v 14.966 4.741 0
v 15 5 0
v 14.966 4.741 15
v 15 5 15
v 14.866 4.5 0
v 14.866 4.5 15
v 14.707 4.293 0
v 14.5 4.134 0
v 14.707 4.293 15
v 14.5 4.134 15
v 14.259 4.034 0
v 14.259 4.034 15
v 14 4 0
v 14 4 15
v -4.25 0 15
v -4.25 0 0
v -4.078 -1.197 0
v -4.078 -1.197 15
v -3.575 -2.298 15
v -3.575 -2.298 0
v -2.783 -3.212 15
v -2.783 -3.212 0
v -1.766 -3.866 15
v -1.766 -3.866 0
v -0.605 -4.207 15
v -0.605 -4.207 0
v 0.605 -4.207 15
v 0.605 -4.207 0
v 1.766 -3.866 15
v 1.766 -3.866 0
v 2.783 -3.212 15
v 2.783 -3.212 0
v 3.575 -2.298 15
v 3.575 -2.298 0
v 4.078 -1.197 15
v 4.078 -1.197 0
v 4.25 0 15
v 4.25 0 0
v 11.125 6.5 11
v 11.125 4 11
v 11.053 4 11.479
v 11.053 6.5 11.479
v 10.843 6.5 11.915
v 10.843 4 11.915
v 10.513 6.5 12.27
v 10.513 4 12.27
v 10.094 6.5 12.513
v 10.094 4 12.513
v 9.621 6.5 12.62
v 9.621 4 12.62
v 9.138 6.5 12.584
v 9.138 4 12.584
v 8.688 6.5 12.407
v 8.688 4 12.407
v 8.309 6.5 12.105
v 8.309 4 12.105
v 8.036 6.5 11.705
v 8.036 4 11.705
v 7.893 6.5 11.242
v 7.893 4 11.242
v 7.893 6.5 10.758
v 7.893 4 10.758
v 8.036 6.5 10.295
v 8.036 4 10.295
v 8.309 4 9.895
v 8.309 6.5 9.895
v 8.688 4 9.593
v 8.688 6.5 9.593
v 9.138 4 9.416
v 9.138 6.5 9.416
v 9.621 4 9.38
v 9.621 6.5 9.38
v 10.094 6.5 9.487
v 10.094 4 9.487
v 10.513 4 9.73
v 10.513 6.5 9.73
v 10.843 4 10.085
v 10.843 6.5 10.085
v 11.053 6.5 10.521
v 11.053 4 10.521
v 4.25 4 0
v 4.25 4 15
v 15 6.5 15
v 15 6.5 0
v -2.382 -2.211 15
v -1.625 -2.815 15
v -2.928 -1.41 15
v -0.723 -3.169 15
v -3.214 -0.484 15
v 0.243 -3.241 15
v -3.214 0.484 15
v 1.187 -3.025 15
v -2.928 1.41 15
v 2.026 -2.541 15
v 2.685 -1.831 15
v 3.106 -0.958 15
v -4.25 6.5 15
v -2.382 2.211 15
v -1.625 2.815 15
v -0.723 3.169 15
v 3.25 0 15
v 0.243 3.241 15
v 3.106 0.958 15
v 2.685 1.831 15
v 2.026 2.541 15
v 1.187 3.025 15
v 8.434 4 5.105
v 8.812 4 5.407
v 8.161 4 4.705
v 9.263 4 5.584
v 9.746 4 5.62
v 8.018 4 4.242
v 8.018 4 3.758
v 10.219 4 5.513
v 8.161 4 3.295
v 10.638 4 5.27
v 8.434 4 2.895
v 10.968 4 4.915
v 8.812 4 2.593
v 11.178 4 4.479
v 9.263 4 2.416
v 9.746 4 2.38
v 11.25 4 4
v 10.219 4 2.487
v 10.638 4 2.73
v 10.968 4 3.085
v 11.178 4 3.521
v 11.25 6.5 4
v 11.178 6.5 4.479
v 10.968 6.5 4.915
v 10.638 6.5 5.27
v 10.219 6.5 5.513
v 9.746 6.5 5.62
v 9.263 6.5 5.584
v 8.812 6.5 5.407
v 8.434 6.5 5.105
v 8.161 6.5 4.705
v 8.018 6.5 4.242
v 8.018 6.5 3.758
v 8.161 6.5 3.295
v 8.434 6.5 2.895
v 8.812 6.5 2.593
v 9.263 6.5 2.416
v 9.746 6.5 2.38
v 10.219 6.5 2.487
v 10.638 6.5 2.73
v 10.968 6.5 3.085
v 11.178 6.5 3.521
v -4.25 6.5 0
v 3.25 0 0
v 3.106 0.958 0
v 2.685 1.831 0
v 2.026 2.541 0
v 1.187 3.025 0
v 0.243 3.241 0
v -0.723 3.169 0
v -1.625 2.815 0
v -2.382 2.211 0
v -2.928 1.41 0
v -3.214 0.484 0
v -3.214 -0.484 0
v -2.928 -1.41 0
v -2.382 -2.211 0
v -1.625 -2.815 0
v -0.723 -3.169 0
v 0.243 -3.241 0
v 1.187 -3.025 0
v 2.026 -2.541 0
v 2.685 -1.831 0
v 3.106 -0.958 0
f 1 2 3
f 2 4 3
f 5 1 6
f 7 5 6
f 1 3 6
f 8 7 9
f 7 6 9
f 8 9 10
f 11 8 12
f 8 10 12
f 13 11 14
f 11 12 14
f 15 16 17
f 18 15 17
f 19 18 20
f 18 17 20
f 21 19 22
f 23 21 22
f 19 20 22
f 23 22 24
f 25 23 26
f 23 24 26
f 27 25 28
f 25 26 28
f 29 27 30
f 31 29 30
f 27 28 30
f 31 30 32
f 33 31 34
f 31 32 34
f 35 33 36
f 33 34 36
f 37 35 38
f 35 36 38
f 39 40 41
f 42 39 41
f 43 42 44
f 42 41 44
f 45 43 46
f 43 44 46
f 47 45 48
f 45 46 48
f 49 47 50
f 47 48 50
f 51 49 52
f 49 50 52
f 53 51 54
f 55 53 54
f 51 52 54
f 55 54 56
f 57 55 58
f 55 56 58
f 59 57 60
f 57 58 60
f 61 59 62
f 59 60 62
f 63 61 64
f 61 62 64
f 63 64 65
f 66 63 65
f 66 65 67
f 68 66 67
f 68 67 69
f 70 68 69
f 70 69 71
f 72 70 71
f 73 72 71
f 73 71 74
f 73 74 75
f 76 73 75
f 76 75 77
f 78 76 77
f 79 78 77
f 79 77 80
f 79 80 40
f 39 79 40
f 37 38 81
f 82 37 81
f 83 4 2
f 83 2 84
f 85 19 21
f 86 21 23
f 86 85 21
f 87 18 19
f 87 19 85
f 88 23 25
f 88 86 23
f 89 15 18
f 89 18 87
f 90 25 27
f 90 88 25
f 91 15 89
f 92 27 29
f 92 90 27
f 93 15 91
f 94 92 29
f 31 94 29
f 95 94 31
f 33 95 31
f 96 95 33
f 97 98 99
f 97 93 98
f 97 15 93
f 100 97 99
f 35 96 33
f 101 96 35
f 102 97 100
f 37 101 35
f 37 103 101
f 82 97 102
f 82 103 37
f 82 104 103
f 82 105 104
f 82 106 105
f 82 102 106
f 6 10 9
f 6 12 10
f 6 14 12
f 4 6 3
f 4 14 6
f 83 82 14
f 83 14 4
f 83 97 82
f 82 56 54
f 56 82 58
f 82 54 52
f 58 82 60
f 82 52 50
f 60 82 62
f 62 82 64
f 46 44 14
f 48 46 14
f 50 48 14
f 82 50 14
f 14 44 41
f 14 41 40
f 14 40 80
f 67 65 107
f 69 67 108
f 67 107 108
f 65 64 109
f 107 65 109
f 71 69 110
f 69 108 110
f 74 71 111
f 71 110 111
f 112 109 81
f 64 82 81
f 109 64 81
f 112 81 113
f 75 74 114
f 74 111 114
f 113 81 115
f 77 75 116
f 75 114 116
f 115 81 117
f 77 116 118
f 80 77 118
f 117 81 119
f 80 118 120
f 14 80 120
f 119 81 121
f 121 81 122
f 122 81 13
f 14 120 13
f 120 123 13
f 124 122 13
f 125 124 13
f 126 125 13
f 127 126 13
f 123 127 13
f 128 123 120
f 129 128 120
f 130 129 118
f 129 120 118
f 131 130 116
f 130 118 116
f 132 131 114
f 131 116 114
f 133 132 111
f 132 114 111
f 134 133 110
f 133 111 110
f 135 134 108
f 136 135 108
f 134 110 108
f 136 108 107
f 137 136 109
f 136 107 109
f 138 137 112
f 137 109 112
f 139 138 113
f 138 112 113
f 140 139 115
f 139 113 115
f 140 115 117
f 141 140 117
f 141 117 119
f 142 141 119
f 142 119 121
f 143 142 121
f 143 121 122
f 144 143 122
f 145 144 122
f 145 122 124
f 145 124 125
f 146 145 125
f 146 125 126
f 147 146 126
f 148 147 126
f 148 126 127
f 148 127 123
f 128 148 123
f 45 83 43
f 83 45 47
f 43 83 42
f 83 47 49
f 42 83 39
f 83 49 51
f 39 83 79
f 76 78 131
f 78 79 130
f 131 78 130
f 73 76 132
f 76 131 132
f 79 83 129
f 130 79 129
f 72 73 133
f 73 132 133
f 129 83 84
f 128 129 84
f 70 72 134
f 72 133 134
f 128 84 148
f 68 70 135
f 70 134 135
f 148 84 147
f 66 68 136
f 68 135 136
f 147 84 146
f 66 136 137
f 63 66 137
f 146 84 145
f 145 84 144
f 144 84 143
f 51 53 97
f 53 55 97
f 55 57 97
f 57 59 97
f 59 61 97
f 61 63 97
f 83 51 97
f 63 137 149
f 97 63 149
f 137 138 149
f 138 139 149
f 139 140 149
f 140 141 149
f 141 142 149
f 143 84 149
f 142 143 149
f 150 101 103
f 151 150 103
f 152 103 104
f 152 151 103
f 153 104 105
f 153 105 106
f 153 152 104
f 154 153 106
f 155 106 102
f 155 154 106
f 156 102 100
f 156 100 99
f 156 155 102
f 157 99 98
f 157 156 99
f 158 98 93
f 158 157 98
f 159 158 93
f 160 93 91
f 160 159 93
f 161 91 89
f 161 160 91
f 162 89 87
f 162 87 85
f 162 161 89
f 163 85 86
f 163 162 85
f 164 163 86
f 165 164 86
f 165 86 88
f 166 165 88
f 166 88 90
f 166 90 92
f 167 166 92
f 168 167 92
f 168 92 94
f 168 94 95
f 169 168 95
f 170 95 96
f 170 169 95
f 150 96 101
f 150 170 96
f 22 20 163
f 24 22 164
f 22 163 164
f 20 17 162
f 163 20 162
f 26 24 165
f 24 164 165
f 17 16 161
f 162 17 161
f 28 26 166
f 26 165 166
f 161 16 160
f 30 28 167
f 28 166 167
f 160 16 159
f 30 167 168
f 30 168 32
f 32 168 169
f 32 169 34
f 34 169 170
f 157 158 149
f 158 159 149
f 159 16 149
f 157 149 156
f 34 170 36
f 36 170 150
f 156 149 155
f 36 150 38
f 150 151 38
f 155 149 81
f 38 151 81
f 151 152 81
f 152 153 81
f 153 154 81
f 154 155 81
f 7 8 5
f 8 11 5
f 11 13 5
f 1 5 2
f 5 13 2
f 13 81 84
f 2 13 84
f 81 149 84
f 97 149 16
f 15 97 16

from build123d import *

# Parameters (mm, degrees)
F0_R     = 3.25
F1_DEPTH = 15
F2_R     = 1.625
F3_DEPTH = 3
F4_R     = 1


with BuildPart() as f1:
    # F0 (on Top) → F1 (new body)
    with BuildSketch(Plane.XY):
        with BuildLine():
            Line((-4.25, 6.5), (-4.25, 0))
            ThreePointArc((-4.25, 0), (0, -4.25), (4.25, 0))
            Line((4.25, 0), (4.25, 4))
            Line((4.25, 4), (15, 4))
            Line((15, 4), (15, 6.5))
            Line((15, 6.5), (-4.25, 6.5))
        make_face()
        Circle(F0_R, mode=Mode.SUBTRACT)
    extrude(amount=F1_DEPTH)

    # F2 (on face) → F3 (cut)
    with BuildSketch(Plane.XZ.offset(-4)):
        with Locations((9.5, 11)):
            Circle(F2_R)
        with Locations((9.625, 4)):
            Circle(F2_R)
    extrude(amount=-F3_DEPTH, mode=Mode.SUBTRACT)

    # F4
    f4_edges = [f1.edges().sort_by_distance(p)[0] for p in [
        (15, 4, 7.5),
    ]]
    fillet(f4_edges, radius=F4_R)


solid = f1.part
